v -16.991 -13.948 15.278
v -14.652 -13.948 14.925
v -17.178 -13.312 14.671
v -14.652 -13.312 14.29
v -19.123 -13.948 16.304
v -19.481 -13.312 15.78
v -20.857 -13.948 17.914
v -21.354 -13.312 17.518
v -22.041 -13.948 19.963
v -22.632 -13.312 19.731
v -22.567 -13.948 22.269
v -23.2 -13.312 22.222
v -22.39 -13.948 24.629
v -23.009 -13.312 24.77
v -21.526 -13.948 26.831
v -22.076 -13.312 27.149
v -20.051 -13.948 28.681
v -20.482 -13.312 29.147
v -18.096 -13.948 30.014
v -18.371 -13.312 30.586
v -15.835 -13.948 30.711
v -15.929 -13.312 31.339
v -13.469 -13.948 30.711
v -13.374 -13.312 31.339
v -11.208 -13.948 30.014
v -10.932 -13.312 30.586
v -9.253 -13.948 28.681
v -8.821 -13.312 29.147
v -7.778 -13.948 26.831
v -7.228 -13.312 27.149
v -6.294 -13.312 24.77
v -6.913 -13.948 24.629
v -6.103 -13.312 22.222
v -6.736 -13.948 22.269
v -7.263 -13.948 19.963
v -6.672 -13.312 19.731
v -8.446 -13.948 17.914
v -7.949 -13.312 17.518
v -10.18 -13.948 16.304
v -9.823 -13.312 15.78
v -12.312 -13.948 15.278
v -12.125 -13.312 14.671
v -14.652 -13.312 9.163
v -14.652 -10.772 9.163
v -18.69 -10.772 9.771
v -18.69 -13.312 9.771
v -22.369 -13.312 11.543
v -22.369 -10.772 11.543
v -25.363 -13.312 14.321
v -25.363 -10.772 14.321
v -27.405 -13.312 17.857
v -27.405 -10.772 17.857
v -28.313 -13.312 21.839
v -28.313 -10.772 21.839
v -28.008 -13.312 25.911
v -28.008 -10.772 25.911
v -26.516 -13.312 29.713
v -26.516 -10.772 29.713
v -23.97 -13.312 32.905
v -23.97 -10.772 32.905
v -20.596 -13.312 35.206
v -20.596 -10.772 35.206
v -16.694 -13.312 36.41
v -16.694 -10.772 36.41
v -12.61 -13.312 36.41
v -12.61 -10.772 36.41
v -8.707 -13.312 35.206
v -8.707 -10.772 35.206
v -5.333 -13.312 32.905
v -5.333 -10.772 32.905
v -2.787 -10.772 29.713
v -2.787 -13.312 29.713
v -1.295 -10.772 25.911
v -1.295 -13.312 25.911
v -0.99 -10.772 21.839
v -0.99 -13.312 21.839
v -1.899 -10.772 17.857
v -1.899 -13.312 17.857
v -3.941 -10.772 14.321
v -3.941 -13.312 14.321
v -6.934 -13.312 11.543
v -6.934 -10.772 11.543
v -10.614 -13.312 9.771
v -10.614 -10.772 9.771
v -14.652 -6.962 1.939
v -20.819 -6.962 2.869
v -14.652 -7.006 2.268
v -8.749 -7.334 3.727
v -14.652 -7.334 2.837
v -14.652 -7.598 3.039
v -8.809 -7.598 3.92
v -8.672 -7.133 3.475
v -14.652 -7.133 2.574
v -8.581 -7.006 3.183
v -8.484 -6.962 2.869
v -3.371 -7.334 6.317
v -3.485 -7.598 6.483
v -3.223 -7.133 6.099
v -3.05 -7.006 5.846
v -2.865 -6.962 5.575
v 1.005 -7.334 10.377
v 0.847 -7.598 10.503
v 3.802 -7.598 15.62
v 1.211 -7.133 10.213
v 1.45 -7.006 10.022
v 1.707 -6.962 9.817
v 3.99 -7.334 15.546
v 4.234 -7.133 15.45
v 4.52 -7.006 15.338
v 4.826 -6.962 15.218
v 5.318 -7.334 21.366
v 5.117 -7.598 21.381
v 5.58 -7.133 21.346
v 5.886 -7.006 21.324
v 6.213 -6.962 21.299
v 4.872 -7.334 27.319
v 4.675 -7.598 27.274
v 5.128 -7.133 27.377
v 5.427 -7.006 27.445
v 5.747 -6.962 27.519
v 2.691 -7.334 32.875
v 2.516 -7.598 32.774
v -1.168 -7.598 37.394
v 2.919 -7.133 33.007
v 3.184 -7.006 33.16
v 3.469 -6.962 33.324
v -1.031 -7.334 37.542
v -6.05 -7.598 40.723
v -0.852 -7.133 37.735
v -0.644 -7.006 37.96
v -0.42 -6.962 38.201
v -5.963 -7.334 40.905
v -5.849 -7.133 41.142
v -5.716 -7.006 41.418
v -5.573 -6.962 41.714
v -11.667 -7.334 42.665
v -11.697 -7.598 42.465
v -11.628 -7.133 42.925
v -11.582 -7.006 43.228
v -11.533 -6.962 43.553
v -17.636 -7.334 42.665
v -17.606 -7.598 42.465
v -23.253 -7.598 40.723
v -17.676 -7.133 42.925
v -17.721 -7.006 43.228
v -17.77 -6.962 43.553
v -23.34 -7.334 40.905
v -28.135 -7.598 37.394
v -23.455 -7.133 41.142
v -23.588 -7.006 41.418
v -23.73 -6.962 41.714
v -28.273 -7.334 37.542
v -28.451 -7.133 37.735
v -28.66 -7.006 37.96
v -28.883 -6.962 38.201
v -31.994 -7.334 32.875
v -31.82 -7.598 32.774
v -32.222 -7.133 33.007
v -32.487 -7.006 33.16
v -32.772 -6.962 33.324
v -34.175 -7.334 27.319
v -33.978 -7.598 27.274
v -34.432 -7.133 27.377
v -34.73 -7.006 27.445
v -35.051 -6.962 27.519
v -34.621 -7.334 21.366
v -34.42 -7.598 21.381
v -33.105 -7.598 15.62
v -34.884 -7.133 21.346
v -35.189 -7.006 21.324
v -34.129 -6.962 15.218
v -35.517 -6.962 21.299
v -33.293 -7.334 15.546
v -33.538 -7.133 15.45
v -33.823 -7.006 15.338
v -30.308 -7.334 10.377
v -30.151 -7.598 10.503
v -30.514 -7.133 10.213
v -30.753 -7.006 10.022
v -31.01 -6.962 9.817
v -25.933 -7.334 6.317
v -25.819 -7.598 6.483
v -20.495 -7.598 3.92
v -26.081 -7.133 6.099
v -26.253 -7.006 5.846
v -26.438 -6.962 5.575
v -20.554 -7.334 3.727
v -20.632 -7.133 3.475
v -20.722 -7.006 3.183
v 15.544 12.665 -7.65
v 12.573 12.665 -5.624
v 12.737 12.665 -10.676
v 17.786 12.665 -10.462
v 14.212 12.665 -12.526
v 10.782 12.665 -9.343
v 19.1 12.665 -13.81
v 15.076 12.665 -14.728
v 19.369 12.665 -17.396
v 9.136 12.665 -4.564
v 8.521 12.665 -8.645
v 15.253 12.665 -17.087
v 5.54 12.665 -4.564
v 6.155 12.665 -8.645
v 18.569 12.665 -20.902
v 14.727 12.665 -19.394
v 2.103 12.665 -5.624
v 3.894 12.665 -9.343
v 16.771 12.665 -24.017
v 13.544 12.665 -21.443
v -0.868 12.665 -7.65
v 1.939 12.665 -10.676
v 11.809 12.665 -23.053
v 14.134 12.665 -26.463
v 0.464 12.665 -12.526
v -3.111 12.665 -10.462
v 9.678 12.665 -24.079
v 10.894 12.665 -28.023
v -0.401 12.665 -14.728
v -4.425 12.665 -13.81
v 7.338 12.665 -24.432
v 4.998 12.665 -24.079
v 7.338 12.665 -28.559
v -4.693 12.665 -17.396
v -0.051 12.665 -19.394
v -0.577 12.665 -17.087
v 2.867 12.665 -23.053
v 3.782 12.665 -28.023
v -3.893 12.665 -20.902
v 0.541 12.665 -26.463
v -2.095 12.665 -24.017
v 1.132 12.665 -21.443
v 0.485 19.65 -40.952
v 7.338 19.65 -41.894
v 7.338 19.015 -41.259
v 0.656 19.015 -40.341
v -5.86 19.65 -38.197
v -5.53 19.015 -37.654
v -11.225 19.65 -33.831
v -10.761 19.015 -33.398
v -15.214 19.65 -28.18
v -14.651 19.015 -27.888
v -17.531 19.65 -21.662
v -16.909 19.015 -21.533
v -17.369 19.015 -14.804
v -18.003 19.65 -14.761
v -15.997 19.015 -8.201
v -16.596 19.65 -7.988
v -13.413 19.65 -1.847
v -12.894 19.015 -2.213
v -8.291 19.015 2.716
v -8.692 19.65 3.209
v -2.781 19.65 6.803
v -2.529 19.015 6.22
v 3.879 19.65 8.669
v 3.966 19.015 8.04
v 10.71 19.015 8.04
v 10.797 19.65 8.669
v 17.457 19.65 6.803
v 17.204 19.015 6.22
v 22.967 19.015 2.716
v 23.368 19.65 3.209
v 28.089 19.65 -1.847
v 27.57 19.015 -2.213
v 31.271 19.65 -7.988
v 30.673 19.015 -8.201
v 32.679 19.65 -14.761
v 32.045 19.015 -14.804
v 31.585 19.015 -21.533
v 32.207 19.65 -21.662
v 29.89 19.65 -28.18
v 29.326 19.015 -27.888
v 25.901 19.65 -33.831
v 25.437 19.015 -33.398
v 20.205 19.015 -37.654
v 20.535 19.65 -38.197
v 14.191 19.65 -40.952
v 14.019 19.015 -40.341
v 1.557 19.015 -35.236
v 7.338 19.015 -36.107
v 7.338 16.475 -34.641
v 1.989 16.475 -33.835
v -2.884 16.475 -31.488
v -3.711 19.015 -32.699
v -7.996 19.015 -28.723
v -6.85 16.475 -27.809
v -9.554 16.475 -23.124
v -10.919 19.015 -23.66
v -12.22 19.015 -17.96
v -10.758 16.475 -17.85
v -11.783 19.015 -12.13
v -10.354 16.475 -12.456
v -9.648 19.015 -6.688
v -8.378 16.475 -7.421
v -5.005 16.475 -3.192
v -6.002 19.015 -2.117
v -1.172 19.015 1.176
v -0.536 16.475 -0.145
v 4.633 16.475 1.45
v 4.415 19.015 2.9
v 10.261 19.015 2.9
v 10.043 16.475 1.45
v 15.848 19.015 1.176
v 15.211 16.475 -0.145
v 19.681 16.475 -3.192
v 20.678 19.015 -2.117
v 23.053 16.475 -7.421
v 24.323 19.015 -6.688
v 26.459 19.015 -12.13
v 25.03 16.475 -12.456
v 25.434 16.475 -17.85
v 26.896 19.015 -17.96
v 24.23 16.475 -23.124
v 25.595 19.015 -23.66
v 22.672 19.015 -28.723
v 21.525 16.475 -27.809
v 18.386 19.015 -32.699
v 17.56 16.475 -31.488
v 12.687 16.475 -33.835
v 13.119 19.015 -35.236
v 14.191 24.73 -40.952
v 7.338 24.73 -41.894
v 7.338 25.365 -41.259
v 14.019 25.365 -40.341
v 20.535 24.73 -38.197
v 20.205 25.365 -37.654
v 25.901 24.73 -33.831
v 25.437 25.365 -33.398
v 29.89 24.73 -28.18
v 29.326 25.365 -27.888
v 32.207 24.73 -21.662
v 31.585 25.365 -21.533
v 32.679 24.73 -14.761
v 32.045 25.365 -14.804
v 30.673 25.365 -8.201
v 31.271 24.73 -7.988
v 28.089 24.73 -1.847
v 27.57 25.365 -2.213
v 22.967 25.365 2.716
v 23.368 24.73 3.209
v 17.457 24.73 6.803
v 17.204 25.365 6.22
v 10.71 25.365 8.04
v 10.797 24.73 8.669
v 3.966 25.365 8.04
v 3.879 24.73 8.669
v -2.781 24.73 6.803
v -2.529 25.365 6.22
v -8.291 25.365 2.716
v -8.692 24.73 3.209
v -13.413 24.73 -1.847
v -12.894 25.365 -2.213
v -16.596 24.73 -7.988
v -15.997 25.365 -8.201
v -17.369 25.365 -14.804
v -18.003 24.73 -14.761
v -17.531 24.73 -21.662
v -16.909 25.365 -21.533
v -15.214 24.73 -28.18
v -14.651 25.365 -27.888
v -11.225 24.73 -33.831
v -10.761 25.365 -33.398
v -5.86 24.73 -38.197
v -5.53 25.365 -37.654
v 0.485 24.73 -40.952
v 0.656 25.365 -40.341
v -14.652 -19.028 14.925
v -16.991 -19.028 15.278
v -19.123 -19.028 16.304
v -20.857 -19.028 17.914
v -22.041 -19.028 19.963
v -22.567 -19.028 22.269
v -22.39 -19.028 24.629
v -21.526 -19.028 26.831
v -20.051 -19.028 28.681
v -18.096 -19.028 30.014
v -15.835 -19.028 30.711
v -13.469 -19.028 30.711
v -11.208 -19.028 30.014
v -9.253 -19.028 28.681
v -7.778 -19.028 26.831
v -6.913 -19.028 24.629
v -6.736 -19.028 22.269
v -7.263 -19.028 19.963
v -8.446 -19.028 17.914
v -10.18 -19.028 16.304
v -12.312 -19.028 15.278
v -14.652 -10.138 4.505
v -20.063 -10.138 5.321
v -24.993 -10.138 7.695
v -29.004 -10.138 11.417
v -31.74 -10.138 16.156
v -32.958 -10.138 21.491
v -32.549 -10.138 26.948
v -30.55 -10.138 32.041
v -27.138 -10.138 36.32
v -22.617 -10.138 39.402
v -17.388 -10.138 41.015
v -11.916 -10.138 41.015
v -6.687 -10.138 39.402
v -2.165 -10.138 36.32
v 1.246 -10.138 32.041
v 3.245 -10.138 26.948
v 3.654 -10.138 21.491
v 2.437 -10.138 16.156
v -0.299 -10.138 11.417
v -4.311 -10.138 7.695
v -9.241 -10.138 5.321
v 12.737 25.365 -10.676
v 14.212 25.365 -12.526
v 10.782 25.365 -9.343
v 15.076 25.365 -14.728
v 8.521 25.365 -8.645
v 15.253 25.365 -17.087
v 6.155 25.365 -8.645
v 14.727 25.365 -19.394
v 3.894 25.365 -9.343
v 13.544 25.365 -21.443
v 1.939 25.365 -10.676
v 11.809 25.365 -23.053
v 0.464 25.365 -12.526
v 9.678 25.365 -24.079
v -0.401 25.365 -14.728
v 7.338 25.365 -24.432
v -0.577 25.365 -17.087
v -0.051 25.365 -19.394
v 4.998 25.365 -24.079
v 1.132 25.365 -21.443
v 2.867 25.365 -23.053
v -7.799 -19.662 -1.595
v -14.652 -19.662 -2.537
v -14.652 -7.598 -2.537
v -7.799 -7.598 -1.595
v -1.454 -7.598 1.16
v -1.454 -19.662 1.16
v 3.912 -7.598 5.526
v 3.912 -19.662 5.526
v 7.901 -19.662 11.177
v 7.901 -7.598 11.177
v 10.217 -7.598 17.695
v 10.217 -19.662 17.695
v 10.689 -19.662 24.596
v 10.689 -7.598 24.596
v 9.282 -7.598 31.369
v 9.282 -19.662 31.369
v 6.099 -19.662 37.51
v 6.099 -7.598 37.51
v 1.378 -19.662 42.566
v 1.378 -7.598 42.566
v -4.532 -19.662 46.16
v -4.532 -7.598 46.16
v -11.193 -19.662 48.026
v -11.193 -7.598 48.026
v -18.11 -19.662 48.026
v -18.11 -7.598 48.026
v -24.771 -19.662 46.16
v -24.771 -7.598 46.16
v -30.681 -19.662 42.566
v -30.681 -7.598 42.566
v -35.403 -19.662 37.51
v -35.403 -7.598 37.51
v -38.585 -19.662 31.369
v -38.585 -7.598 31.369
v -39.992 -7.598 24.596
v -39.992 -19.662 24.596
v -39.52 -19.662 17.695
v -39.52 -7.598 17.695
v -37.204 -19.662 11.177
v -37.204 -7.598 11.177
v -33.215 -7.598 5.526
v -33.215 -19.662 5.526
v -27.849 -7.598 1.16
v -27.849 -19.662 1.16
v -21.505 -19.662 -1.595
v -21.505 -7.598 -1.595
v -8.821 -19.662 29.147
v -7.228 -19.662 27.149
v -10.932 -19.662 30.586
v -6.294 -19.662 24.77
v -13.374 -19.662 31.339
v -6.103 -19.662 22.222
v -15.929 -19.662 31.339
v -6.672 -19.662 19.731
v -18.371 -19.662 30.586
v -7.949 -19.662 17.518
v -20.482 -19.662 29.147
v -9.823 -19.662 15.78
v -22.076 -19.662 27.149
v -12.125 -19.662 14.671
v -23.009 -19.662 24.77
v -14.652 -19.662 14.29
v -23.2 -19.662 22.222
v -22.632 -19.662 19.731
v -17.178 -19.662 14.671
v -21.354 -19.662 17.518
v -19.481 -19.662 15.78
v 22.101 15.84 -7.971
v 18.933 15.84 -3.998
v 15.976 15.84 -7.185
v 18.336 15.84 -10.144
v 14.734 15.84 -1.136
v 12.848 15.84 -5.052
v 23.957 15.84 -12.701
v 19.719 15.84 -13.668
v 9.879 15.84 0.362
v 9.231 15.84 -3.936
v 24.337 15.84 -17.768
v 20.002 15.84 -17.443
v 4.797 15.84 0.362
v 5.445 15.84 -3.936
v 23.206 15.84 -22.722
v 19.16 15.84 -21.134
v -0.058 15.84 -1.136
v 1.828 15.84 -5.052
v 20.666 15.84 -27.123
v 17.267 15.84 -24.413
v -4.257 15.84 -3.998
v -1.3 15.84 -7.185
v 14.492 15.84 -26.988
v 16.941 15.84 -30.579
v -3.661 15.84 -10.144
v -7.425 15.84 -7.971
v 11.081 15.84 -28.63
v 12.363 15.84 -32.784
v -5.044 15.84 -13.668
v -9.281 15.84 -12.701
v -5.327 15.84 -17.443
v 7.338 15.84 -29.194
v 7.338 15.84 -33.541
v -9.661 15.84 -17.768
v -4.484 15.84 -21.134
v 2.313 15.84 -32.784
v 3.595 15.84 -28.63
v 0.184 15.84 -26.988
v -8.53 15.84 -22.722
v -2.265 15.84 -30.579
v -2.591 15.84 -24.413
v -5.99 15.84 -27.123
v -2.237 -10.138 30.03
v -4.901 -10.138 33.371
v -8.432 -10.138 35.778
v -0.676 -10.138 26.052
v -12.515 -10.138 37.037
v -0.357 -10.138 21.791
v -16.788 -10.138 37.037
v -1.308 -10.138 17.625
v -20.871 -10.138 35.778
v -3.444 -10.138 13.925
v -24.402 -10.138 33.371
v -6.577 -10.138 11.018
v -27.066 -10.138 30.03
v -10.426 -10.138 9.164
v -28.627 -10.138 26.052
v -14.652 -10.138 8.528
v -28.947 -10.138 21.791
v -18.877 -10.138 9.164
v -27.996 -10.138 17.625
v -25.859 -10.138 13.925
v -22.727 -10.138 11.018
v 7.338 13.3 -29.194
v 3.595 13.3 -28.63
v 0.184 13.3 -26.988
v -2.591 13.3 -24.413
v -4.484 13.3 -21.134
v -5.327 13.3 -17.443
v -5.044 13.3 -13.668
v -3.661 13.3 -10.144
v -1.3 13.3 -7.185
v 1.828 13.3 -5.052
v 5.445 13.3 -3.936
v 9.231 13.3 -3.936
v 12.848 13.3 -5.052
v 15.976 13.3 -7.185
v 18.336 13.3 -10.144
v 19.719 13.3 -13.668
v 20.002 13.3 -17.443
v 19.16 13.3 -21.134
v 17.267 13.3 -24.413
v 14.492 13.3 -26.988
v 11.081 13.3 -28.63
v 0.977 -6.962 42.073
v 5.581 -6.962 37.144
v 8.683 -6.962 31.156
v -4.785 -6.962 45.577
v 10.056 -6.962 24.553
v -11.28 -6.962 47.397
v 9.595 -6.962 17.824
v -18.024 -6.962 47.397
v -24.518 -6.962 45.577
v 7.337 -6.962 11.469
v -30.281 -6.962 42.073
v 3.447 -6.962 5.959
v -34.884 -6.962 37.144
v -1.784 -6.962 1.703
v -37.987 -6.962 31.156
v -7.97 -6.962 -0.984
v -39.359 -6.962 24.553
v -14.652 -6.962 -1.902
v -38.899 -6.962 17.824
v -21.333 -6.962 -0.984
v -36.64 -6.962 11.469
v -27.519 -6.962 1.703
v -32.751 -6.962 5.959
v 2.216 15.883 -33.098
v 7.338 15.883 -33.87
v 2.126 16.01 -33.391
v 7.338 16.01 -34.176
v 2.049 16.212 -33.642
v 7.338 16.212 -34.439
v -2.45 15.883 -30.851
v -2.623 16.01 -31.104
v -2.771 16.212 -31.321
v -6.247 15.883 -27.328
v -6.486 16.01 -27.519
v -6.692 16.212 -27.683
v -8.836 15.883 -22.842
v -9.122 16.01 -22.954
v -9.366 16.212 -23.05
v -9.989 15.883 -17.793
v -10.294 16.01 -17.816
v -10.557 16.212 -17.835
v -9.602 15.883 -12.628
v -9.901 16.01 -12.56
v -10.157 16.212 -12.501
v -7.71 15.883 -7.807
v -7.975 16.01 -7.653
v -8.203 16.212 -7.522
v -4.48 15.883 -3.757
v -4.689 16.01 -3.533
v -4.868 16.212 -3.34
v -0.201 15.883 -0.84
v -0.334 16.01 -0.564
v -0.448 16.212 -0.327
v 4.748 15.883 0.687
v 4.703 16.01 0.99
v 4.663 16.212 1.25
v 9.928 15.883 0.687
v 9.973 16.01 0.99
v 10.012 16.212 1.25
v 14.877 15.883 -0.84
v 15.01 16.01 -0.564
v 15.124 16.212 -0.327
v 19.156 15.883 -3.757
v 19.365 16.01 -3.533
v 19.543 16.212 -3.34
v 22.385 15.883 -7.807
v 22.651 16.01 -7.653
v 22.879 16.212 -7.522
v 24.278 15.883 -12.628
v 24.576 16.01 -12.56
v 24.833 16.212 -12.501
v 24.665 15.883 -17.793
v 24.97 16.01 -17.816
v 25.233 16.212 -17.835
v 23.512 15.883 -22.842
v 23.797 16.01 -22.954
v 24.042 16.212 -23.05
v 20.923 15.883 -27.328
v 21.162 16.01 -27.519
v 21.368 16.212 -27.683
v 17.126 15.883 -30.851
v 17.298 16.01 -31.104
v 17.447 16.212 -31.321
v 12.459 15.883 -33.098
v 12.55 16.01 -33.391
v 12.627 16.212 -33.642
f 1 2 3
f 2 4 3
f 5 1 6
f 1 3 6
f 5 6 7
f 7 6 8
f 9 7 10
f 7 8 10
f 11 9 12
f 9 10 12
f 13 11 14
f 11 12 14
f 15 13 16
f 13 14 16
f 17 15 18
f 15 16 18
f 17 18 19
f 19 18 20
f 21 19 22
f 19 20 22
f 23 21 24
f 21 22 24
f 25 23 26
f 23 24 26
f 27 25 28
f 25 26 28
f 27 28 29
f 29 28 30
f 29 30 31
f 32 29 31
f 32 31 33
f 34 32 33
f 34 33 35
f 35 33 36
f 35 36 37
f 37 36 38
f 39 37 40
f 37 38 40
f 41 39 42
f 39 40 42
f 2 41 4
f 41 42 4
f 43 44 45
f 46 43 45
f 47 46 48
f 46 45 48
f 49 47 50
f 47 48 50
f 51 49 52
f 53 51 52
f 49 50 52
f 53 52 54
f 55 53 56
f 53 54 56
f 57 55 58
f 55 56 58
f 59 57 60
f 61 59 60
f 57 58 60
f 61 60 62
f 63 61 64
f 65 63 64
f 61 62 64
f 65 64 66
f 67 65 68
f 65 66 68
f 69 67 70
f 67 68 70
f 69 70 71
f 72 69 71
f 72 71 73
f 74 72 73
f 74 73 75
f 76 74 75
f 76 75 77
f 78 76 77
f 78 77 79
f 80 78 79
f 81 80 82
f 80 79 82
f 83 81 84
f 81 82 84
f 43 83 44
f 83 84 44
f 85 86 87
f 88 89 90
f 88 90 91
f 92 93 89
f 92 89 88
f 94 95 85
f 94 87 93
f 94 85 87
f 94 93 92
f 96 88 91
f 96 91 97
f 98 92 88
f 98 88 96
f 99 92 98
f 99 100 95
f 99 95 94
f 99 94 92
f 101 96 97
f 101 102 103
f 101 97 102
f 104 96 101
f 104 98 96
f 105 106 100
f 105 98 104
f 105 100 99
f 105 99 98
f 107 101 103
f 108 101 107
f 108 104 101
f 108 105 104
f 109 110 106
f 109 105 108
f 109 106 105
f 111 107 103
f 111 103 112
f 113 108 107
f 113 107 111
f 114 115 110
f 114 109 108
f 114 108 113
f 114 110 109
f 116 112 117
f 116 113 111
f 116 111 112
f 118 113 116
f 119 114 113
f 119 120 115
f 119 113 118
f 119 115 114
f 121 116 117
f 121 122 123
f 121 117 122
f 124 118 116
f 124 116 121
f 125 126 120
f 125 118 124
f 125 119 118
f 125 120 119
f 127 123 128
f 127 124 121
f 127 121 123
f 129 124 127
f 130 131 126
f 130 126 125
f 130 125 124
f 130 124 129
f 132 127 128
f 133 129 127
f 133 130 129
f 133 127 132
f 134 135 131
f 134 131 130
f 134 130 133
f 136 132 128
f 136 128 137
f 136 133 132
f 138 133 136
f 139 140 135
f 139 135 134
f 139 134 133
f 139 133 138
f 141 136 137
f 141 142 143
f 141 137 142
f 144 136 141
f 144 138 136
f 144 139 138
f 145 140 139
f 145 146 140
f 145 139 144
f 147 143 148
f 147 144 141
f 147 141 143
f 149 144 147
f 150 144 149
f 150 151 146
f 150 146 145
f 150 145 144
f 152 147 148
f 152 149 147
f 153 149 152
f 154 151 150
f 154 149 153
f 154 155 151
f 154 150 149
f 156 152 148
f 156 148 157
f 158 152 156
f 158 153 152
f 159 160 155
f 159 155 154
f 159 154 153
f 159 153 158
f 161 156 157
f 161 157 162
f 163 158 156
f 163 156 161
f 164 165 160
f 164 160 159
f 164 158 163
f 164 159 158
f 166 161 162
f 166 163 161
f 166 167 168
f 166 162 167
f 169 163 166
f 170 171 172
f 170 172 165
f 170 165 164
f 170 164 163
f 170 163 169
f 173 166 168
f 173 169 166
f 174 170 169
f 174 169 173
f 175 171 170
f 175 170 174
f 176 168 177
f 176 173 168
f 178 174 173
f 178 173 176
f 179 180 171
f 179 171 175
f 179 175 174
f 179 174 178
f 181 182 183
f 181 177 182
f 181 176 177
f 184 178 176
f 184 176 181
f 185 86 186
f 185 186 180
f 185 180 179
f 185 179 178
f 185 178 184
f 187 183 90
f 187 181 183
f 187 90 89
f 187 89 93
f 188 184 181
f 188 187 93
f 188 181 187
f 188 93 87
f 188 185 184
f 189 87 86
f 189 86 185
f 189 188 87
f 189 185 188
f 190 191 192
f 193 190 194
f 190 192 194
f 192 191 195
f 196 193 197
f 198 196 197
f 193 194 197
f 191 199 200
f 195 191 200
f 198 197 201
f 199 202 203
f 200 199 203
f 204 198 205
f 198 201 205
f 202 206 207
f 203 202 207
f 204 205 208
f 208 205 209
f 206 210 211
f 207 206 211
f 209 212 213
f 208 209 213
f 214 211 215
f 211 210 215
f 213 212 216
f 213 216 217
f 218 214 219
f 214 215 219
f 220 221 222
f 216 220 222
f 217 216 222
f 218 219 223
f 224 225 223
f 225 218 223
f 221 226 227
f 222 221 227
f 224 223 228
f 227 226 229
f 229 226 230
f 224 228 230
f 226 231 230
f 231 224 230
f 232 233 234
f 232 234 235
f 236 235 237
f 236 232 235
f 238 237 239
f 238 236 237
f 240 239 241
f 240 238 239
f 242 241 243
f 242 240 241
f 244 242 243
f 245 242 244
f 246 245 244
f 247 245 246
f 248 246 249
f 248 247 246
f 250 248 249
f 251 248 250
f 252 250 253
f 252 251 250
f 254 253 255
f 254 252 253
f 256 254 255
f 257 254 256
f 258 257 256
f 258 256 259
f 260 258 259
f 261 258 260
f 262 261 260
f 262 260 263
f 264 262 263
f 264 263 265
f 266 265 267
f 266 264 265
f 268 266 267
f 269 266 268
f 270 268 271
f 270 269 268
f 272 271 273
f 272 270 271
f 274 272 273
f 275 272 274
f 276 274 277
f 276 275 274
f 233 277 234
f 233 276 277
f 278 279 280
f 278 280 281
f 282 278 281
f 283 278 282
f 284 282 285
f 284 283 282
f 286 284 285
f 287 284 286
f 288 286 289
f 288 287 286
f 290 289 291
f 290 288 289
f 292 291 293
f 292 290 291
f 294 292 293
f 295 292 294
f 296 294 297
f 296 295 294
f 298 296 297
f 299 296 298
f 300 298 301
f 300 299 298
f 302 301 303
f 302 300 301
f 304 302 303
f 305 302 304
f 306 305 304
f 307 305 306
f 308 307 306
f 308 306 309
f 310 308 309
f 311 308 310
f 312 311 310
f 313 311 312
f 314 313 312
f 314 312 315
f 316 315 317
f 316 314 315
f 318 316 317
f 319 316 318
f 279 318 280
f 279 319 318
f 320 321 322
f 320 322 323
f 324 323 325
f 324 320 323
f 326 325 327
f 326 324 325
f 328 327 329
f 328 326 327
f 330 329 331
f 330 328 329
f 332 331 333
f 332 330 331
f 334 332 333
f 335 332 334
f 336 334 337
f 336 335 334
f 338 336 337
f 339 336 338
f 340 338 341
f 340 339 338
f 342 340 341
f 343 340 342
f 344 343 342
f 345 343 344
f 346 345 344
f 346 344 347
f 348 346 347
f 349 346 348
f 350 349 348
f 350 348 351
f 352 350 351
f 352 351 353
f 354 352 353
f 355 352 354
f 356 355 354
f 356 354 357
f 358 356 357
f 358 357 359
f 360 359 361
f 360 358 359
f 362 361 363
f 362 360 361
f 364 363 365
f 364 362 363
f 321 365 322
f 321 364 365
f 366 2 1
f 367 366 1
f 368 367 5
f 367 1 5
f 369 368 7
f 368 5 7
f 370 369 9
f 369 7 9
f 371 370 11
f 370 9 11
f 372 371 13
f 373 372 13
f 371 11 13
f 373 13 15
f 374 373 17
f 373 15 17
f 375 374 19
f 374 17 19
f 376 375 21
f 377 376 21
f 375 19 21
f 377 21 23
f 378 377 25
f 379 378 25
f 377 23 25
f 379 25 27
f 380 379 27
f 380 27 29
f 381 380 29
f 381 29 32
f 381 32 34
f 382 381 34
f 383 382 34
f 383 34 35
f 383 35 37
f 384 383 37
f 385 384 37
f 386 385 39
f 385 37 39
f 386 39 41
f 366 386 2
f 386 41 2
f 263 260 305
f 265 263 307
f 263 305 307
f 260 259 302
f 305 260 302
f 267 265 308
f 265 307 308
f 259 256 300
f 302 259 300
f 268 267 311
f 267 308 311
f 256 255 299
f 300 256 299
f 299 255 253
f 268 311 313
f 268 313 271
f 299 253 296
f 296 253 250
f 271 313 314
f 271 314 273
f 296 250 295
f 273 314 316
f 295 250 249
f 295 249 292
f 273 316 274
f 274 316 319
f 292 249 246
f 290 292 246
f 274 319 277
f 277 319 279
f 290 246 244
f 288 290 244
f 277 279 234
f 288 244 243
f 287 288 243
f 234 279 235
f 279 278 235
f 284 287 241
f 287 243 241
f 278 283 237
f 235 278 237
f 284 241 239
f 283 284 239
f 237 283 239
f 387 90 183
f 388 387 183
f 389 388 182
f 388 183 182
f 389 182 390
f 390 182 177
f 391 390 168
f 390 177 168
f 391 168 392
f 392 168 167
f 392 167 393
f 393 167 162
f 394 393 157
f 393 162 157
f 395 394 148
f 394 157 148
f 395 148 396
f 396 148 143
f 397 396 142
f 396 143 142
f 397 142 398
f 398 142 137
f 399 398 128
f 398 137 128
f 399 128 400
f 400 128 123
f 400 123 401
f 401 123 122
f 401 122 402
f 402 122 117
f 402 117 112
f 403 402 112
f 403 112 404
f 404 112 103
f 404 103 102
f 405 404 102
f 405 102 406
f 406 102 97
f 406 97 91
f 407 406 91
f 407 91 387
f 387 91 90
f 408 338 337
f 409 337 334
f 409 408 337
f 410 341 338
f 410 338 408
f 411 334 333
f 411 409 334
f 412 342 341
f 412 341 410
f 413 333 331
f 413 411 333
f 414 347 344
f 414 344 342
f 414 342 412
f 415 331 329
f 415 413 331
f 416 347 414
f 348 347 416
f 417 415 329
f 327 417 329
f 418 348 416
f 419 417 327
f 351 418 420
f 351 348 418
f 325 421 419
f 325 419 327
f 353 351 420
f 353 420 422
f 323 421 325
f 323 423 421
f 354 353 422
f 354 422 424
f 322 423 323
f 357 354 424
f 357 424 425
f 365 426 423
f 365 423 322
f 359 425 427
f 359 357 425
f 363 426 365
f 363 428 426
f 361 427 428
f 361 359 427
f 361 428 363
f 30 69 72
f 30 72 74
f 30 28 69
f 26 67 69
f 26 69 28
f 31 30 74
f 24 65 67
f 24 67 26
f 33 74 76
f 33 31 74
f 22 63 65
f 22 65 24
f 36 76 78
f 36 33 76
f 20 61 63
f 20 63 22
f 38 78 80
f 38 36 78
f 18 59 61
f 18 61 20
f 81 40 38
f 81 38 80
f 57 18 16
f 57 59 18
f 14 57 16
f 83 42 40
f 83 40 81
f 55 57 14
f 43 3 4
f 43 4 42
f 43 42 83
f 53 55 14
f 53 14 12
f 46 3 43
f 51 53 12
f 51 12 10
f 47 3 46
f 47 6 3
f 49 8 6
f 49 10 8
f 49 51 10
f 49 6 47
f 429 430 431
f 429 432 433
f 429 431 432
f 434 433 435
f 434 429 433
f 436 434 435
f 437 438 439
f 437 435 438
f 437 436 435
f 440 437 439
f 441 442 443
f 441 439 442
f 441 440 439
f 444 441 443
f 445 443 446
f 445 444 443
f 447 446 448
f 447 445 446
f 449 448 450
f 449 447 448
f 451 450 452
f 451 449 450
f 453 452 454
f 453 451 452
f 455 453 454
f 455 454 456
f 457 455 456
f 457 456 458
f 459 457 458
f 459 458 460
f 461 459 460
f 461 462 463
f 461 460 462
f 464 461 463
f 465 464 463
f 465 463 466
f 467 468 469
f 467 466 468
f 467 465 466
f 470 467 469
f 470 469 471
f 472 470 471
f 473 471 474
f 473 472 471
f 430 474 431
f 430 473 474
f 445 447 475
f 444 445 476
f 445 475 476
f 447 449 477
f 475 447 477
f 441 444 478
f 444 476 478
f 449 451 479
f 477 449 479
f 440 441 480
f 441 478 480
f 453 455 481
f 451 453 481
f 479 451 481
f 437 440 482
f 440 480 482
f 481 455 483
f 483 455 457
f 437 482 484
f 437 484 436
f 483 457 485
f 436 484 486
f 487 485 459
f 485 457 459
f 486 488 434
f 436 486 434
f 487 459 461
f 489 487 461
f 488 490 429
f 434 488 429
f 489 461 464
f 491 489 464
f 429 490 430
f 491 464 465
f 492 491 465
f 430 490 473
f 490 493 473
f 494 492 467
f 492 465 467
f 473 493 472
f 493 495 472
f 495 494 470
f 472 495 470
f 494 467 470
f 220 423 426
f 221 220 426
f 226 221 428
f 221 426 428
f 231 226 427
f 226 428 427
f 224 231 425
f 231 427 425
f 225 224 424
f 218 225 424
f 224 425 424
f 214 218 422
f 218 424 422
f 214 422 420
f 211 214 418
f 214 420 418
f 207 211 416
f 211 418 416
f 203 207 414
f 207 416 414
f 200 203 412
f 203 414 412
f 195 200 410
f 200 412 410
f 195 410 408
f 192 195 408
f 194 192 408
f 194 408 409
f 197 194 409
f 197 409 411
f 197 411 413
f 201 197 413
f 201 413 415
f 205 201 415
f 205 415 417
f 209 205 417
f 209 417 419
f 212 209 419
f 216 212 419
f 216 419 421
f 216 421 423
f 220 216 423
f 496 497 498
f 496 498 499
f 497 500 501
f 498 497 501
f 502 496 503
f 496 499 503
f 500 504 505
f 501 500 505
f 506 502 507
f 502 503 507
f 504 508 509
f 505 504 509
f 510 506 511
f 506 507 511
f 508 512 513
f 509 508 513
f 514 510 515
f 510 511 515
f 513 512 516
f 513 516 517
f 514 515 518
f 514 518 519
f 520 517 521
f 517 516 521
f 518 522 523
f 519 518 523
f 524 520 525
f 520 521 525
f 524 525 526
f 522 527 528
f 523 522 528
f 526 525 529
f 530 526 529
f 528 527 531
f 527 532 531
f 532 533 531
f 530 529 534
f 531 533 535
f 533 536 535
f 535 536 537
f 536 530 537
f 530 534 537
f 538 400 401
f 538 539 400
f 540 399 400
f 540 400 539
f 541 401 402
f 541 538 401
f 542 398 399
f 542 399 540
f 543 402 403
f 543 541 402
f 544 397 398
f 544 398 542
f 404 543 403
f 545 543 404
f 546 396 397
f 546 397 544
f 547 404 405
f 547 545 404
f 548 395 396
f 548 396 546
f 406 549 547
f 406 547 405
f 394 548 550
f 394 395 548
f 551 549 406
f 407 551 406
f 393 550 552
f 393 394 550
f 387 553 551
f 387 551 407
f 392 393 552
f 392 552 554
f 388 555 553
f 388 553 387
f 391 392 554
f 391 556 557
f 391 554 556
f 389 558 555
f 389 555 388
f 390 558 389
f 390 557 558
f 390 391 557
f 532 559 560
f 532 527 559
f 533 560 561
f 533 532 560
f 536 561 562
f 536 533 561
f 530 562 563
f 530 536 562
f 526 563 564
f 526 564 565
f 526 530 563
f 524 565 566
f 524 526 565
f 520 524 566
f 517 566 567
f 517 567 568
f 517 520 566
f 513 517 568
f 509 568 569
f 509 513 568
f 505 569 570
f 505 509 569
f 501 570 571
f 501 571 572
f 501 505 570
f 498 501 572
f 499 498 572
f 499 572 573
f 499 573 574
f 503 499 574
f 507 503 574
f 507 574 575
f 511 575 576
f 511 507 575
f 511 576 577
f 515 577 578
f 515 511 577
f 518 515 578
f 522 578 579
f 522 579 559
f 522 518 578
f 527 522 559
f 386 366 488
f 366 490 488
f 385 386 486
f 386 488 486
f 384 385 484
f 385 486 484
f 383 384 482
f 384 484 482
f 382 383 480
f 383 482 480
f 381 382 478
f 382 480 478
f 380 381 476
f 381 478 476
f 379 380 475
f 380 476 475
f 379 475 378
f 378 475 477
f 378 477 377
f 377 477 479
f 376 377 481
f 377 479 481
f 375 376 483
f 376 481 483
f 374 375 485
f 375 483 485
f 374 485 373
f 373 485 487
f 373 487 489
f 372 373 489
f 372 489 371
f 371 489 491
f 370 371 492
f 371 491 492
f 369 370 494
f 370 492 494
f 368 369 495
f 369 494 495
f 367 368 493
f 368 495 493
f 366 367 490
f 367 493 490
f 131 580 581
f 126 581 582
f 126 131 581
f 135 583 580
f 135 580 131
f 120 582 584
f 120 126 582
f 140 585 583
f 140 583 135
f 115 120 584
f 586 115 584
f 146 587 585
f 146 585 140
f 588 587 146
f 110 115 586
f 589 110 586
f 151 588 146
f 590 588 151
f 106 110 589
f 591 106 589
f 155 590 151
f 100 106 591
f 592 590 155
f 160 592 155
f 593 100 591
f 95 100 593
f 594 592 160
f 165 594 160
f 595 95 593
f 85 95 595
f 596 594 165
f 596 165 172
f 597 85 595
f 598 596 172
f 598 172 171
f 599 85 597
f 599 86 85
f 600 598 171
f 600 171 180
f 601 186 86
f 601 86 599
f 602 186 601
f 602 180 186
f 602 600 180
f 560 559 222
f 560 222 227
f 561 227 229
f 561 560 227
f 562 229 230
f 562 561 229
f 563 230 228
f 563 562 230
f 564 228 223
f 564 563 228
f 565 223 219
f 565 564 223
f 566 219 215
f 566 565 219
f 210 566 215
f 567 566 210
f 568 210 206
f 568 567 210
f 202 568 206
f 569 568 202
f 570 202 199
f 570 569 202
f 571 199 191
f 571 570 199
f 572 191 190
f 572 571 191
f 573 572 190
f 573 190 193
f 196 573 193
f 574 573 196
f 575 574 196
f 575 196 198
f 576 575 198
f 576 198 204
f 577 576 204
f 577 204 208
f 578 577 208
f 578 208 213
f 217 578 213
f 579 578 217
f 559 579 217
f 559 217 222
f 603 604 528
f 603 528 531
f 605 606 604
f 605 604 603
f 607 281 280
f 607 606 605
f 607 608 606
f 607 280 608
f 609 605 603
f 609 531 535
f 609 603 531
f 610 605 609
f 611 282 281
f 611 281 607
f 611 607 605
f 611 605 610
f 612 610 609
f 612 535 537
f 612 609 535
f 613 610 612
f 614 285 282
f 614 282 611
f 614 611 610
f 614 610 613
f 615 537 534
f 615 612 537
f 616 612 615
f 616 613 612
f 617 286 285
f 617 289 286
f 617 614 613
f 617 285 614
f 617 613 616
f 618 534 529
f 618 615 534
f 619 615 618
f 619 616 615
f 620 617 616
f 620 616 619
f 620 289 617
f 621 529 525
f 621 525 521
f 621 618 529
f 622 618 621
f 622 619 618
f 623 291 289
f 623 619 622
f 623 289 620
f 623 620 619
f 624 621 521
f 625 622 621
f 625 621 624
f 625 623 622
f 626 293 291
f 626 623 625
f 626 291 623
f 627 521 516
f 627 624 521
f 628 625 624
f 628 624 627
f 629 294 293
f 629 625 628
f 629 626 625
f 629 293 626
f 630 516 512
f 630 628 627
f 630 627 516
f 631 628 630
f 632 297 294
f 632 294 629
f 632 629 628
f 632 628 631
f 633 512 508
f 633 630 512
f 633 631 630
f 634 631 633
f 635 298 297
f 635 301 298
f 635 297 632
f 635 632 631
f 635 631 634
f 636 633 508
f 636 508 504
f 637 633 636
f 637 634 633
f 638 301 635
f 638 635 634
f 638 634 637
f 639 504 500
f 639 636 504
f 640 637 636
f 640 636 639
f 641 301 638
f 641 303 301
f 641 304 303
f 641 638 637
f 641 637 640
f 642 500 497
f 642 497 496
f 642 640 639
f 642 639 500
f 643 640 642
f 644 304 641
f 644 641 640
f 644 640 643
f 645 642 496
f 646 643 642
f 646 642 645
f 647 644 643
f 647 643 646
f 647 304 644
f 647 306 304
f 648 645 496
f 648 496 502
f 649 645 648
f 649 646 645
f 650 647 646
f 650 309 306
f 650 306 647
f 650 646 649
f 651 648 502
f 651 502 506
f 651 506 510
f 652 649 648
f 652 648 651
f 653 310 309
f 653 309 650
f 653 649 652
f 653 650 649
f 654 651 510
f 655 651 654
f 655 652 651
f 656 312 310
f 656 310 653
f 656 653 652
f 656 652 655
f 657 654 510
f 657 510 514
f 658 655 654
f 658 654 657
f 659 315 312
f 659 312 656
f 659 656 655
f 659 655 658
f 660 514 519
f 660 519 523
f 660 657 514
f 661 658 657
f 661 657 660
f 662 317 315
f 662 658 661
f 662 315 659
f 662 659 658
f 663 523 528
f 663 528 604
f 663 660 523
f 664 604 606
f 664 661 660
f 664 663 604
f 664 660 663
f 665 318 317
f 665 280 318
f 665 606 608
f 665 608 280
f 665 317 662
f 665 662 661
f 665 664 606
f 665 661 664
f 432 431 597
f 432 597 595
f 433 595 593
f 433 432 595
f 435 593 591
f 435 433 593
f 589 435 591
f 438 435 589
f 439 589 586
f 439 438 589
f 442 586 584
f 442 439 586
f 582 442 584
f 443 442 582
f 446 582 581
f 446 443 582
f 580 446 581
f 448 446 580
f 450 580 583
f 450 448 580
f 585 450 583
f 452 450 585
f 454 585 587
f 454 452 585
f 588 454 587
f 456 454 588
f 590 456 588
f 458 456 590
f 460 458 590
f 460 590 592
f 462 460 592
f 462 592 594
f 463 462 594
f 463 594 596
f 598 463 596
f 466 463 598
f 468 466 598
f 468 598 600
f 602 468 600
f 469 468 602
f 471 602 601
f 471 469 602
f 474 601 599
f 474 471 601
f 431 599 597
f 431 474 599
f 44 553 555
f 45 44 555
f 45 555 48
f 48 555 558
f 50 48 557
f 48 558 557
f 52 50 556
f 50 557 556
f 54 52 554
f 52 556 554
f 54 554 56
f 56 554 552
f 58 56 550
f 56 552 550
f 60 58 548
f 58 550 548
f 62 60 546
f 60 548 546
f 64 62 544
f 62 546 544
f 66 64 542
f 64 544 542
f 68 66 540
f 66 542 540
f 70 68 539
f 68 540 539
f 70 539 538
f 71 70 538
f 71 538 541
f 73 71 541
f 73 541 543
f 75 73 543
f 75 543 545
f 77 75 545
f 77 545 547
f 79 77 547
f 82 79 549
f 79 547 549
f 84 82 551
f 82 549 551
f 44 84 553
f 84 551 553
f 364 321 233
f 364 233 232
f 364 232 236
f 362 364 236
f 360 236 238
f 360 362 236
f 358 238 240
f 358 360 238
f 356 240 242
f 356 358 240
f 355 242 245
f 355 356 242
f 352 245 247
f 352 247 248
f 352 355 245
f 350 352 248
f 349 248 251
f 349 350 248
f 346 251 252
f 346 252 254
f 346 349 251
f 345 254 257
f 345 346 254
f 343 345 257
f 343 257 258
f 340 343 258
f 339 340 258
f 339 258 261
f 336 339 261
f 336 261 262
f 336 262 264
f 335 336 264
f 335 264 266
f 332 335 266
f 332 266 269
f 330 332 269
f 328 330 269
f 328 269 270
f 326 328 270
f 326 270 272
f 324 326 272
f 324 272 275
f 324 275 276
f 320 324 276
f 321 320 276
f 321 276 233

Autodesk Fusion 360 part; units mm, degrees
sketch "Sketch1" plane through (0, 0, 0) normal (1, 0, 0) x (0, 0, -1)
  line L0 (7.9375, 0) -> (12.7, 0)
  line L1 (12.7, 0) -> (12.7, 3.175)
  line L2 (12.7, 3.175) -> (17.78, 3.175)
  line L3 (17.78, 3.175) -> (19.6131, 6.35)
  line L4 (19.6131, 6.35) -> (25.4, 6.35)
  line L5 (25.4, 6.35) -> (25.4, 12.7)
  line L6 (25.4, 12.7) -> (7.9375, 12.7)
  line L7 (7.9375, 0) -> (7.9375, 12.7)
  line L8 (7.9375, -1) -> (13.7, -1)
  line L9 (13.7, -1) -> (13.7, 2.175)
  line L10 (13.7, 2.175) -> (18.3574, 2.175)
  line L11 (18.3574, 2.175) -> (20.1904, 5.35)
  line L12 (20.1904, 5.35) -> (25.4, 5.35)
  line L13 (25.4, 5.35) -> (25.4, -7.35)
  line L14 (25.4, -7.35) -> (7.9375, -7.35)
  line L15 (7.9375, -7.35) -> (7.9375, -1)
  dimension "d2" = 3.175
  dimension "d3" = 5.08
  dimension "d4" = 60
  dimension "d5" = 6.35
  dimension "d9" = 12.7
  dimension "d10" = 7.9375
  dimension "d11" = 4.7625
  dimension "d12" = 17.4625
  dimension "d13" = 1
  dimension "d14" = 6.35
  dimension "d15" = 5.7625
  dimension "d16" = 3.175
  dimension "d17" = 4.6573
  dimension "d18" = 5.2096
  dimension "d19" = 12.7
  dimension "d20" = 3.175
revolve "Revolve1" add sketch "Sketch1" angle 360 about axis through (0, 1.75, 0) along (0, 1, 0) makes body 1 at (1.6562, 12.7, -19.455) makes body 2 at (2.529, 1.1167, -25.2738)
copy_body "Body->Comp1" bodies 2 removing the originals makes body 3 in component "Die"
copy_body "Body->Comp2" bodies 1 removing the originals makes body 4 in component "Punch"
chamfer "Chamfer1" distance 0.635 angle 45 2 edges at (-23.6811, 6.35, -9.185) (-23.6811, 12.7, -9.185) on bodies 4 in component "Punch"
chamfer "Chamfer2" distance 0.635 angle 45 1 edges at (-11.8406, 0, -4.5925) on bodies 4 in component "Punch"
chamfer "Chamfer1'" distance 0.635 angle 45 4 edges at (-23.6811, 5.35, -9.185) (-12.7729, 2.175, -4.9541) (-7.4003, -1, -2.8703) (-7.4003, -7.35, -2.8703) on bodies 3 in component "Die"
fillet "Fillet1" radius 1.27 1 edges at (-18.8241, 5.35, -7.3012) on bodies 3 in component "Die"
fillet "Fillet1'" radius 1.27 1 edges at (-16.5768, 3.175, -6.4295) on bodies 4 in component "Punch"
component "Die" placed x (1, 0, 0) y (0, 1, 0) z (0, 0, 1) at (-14.6517, -12.3125, 22.8626)
component "Punch" placed x (1, 0, 0) y (0, 1, 0) z (0, 0, 1) at (7.3379, 12.6646, -16.4943)
